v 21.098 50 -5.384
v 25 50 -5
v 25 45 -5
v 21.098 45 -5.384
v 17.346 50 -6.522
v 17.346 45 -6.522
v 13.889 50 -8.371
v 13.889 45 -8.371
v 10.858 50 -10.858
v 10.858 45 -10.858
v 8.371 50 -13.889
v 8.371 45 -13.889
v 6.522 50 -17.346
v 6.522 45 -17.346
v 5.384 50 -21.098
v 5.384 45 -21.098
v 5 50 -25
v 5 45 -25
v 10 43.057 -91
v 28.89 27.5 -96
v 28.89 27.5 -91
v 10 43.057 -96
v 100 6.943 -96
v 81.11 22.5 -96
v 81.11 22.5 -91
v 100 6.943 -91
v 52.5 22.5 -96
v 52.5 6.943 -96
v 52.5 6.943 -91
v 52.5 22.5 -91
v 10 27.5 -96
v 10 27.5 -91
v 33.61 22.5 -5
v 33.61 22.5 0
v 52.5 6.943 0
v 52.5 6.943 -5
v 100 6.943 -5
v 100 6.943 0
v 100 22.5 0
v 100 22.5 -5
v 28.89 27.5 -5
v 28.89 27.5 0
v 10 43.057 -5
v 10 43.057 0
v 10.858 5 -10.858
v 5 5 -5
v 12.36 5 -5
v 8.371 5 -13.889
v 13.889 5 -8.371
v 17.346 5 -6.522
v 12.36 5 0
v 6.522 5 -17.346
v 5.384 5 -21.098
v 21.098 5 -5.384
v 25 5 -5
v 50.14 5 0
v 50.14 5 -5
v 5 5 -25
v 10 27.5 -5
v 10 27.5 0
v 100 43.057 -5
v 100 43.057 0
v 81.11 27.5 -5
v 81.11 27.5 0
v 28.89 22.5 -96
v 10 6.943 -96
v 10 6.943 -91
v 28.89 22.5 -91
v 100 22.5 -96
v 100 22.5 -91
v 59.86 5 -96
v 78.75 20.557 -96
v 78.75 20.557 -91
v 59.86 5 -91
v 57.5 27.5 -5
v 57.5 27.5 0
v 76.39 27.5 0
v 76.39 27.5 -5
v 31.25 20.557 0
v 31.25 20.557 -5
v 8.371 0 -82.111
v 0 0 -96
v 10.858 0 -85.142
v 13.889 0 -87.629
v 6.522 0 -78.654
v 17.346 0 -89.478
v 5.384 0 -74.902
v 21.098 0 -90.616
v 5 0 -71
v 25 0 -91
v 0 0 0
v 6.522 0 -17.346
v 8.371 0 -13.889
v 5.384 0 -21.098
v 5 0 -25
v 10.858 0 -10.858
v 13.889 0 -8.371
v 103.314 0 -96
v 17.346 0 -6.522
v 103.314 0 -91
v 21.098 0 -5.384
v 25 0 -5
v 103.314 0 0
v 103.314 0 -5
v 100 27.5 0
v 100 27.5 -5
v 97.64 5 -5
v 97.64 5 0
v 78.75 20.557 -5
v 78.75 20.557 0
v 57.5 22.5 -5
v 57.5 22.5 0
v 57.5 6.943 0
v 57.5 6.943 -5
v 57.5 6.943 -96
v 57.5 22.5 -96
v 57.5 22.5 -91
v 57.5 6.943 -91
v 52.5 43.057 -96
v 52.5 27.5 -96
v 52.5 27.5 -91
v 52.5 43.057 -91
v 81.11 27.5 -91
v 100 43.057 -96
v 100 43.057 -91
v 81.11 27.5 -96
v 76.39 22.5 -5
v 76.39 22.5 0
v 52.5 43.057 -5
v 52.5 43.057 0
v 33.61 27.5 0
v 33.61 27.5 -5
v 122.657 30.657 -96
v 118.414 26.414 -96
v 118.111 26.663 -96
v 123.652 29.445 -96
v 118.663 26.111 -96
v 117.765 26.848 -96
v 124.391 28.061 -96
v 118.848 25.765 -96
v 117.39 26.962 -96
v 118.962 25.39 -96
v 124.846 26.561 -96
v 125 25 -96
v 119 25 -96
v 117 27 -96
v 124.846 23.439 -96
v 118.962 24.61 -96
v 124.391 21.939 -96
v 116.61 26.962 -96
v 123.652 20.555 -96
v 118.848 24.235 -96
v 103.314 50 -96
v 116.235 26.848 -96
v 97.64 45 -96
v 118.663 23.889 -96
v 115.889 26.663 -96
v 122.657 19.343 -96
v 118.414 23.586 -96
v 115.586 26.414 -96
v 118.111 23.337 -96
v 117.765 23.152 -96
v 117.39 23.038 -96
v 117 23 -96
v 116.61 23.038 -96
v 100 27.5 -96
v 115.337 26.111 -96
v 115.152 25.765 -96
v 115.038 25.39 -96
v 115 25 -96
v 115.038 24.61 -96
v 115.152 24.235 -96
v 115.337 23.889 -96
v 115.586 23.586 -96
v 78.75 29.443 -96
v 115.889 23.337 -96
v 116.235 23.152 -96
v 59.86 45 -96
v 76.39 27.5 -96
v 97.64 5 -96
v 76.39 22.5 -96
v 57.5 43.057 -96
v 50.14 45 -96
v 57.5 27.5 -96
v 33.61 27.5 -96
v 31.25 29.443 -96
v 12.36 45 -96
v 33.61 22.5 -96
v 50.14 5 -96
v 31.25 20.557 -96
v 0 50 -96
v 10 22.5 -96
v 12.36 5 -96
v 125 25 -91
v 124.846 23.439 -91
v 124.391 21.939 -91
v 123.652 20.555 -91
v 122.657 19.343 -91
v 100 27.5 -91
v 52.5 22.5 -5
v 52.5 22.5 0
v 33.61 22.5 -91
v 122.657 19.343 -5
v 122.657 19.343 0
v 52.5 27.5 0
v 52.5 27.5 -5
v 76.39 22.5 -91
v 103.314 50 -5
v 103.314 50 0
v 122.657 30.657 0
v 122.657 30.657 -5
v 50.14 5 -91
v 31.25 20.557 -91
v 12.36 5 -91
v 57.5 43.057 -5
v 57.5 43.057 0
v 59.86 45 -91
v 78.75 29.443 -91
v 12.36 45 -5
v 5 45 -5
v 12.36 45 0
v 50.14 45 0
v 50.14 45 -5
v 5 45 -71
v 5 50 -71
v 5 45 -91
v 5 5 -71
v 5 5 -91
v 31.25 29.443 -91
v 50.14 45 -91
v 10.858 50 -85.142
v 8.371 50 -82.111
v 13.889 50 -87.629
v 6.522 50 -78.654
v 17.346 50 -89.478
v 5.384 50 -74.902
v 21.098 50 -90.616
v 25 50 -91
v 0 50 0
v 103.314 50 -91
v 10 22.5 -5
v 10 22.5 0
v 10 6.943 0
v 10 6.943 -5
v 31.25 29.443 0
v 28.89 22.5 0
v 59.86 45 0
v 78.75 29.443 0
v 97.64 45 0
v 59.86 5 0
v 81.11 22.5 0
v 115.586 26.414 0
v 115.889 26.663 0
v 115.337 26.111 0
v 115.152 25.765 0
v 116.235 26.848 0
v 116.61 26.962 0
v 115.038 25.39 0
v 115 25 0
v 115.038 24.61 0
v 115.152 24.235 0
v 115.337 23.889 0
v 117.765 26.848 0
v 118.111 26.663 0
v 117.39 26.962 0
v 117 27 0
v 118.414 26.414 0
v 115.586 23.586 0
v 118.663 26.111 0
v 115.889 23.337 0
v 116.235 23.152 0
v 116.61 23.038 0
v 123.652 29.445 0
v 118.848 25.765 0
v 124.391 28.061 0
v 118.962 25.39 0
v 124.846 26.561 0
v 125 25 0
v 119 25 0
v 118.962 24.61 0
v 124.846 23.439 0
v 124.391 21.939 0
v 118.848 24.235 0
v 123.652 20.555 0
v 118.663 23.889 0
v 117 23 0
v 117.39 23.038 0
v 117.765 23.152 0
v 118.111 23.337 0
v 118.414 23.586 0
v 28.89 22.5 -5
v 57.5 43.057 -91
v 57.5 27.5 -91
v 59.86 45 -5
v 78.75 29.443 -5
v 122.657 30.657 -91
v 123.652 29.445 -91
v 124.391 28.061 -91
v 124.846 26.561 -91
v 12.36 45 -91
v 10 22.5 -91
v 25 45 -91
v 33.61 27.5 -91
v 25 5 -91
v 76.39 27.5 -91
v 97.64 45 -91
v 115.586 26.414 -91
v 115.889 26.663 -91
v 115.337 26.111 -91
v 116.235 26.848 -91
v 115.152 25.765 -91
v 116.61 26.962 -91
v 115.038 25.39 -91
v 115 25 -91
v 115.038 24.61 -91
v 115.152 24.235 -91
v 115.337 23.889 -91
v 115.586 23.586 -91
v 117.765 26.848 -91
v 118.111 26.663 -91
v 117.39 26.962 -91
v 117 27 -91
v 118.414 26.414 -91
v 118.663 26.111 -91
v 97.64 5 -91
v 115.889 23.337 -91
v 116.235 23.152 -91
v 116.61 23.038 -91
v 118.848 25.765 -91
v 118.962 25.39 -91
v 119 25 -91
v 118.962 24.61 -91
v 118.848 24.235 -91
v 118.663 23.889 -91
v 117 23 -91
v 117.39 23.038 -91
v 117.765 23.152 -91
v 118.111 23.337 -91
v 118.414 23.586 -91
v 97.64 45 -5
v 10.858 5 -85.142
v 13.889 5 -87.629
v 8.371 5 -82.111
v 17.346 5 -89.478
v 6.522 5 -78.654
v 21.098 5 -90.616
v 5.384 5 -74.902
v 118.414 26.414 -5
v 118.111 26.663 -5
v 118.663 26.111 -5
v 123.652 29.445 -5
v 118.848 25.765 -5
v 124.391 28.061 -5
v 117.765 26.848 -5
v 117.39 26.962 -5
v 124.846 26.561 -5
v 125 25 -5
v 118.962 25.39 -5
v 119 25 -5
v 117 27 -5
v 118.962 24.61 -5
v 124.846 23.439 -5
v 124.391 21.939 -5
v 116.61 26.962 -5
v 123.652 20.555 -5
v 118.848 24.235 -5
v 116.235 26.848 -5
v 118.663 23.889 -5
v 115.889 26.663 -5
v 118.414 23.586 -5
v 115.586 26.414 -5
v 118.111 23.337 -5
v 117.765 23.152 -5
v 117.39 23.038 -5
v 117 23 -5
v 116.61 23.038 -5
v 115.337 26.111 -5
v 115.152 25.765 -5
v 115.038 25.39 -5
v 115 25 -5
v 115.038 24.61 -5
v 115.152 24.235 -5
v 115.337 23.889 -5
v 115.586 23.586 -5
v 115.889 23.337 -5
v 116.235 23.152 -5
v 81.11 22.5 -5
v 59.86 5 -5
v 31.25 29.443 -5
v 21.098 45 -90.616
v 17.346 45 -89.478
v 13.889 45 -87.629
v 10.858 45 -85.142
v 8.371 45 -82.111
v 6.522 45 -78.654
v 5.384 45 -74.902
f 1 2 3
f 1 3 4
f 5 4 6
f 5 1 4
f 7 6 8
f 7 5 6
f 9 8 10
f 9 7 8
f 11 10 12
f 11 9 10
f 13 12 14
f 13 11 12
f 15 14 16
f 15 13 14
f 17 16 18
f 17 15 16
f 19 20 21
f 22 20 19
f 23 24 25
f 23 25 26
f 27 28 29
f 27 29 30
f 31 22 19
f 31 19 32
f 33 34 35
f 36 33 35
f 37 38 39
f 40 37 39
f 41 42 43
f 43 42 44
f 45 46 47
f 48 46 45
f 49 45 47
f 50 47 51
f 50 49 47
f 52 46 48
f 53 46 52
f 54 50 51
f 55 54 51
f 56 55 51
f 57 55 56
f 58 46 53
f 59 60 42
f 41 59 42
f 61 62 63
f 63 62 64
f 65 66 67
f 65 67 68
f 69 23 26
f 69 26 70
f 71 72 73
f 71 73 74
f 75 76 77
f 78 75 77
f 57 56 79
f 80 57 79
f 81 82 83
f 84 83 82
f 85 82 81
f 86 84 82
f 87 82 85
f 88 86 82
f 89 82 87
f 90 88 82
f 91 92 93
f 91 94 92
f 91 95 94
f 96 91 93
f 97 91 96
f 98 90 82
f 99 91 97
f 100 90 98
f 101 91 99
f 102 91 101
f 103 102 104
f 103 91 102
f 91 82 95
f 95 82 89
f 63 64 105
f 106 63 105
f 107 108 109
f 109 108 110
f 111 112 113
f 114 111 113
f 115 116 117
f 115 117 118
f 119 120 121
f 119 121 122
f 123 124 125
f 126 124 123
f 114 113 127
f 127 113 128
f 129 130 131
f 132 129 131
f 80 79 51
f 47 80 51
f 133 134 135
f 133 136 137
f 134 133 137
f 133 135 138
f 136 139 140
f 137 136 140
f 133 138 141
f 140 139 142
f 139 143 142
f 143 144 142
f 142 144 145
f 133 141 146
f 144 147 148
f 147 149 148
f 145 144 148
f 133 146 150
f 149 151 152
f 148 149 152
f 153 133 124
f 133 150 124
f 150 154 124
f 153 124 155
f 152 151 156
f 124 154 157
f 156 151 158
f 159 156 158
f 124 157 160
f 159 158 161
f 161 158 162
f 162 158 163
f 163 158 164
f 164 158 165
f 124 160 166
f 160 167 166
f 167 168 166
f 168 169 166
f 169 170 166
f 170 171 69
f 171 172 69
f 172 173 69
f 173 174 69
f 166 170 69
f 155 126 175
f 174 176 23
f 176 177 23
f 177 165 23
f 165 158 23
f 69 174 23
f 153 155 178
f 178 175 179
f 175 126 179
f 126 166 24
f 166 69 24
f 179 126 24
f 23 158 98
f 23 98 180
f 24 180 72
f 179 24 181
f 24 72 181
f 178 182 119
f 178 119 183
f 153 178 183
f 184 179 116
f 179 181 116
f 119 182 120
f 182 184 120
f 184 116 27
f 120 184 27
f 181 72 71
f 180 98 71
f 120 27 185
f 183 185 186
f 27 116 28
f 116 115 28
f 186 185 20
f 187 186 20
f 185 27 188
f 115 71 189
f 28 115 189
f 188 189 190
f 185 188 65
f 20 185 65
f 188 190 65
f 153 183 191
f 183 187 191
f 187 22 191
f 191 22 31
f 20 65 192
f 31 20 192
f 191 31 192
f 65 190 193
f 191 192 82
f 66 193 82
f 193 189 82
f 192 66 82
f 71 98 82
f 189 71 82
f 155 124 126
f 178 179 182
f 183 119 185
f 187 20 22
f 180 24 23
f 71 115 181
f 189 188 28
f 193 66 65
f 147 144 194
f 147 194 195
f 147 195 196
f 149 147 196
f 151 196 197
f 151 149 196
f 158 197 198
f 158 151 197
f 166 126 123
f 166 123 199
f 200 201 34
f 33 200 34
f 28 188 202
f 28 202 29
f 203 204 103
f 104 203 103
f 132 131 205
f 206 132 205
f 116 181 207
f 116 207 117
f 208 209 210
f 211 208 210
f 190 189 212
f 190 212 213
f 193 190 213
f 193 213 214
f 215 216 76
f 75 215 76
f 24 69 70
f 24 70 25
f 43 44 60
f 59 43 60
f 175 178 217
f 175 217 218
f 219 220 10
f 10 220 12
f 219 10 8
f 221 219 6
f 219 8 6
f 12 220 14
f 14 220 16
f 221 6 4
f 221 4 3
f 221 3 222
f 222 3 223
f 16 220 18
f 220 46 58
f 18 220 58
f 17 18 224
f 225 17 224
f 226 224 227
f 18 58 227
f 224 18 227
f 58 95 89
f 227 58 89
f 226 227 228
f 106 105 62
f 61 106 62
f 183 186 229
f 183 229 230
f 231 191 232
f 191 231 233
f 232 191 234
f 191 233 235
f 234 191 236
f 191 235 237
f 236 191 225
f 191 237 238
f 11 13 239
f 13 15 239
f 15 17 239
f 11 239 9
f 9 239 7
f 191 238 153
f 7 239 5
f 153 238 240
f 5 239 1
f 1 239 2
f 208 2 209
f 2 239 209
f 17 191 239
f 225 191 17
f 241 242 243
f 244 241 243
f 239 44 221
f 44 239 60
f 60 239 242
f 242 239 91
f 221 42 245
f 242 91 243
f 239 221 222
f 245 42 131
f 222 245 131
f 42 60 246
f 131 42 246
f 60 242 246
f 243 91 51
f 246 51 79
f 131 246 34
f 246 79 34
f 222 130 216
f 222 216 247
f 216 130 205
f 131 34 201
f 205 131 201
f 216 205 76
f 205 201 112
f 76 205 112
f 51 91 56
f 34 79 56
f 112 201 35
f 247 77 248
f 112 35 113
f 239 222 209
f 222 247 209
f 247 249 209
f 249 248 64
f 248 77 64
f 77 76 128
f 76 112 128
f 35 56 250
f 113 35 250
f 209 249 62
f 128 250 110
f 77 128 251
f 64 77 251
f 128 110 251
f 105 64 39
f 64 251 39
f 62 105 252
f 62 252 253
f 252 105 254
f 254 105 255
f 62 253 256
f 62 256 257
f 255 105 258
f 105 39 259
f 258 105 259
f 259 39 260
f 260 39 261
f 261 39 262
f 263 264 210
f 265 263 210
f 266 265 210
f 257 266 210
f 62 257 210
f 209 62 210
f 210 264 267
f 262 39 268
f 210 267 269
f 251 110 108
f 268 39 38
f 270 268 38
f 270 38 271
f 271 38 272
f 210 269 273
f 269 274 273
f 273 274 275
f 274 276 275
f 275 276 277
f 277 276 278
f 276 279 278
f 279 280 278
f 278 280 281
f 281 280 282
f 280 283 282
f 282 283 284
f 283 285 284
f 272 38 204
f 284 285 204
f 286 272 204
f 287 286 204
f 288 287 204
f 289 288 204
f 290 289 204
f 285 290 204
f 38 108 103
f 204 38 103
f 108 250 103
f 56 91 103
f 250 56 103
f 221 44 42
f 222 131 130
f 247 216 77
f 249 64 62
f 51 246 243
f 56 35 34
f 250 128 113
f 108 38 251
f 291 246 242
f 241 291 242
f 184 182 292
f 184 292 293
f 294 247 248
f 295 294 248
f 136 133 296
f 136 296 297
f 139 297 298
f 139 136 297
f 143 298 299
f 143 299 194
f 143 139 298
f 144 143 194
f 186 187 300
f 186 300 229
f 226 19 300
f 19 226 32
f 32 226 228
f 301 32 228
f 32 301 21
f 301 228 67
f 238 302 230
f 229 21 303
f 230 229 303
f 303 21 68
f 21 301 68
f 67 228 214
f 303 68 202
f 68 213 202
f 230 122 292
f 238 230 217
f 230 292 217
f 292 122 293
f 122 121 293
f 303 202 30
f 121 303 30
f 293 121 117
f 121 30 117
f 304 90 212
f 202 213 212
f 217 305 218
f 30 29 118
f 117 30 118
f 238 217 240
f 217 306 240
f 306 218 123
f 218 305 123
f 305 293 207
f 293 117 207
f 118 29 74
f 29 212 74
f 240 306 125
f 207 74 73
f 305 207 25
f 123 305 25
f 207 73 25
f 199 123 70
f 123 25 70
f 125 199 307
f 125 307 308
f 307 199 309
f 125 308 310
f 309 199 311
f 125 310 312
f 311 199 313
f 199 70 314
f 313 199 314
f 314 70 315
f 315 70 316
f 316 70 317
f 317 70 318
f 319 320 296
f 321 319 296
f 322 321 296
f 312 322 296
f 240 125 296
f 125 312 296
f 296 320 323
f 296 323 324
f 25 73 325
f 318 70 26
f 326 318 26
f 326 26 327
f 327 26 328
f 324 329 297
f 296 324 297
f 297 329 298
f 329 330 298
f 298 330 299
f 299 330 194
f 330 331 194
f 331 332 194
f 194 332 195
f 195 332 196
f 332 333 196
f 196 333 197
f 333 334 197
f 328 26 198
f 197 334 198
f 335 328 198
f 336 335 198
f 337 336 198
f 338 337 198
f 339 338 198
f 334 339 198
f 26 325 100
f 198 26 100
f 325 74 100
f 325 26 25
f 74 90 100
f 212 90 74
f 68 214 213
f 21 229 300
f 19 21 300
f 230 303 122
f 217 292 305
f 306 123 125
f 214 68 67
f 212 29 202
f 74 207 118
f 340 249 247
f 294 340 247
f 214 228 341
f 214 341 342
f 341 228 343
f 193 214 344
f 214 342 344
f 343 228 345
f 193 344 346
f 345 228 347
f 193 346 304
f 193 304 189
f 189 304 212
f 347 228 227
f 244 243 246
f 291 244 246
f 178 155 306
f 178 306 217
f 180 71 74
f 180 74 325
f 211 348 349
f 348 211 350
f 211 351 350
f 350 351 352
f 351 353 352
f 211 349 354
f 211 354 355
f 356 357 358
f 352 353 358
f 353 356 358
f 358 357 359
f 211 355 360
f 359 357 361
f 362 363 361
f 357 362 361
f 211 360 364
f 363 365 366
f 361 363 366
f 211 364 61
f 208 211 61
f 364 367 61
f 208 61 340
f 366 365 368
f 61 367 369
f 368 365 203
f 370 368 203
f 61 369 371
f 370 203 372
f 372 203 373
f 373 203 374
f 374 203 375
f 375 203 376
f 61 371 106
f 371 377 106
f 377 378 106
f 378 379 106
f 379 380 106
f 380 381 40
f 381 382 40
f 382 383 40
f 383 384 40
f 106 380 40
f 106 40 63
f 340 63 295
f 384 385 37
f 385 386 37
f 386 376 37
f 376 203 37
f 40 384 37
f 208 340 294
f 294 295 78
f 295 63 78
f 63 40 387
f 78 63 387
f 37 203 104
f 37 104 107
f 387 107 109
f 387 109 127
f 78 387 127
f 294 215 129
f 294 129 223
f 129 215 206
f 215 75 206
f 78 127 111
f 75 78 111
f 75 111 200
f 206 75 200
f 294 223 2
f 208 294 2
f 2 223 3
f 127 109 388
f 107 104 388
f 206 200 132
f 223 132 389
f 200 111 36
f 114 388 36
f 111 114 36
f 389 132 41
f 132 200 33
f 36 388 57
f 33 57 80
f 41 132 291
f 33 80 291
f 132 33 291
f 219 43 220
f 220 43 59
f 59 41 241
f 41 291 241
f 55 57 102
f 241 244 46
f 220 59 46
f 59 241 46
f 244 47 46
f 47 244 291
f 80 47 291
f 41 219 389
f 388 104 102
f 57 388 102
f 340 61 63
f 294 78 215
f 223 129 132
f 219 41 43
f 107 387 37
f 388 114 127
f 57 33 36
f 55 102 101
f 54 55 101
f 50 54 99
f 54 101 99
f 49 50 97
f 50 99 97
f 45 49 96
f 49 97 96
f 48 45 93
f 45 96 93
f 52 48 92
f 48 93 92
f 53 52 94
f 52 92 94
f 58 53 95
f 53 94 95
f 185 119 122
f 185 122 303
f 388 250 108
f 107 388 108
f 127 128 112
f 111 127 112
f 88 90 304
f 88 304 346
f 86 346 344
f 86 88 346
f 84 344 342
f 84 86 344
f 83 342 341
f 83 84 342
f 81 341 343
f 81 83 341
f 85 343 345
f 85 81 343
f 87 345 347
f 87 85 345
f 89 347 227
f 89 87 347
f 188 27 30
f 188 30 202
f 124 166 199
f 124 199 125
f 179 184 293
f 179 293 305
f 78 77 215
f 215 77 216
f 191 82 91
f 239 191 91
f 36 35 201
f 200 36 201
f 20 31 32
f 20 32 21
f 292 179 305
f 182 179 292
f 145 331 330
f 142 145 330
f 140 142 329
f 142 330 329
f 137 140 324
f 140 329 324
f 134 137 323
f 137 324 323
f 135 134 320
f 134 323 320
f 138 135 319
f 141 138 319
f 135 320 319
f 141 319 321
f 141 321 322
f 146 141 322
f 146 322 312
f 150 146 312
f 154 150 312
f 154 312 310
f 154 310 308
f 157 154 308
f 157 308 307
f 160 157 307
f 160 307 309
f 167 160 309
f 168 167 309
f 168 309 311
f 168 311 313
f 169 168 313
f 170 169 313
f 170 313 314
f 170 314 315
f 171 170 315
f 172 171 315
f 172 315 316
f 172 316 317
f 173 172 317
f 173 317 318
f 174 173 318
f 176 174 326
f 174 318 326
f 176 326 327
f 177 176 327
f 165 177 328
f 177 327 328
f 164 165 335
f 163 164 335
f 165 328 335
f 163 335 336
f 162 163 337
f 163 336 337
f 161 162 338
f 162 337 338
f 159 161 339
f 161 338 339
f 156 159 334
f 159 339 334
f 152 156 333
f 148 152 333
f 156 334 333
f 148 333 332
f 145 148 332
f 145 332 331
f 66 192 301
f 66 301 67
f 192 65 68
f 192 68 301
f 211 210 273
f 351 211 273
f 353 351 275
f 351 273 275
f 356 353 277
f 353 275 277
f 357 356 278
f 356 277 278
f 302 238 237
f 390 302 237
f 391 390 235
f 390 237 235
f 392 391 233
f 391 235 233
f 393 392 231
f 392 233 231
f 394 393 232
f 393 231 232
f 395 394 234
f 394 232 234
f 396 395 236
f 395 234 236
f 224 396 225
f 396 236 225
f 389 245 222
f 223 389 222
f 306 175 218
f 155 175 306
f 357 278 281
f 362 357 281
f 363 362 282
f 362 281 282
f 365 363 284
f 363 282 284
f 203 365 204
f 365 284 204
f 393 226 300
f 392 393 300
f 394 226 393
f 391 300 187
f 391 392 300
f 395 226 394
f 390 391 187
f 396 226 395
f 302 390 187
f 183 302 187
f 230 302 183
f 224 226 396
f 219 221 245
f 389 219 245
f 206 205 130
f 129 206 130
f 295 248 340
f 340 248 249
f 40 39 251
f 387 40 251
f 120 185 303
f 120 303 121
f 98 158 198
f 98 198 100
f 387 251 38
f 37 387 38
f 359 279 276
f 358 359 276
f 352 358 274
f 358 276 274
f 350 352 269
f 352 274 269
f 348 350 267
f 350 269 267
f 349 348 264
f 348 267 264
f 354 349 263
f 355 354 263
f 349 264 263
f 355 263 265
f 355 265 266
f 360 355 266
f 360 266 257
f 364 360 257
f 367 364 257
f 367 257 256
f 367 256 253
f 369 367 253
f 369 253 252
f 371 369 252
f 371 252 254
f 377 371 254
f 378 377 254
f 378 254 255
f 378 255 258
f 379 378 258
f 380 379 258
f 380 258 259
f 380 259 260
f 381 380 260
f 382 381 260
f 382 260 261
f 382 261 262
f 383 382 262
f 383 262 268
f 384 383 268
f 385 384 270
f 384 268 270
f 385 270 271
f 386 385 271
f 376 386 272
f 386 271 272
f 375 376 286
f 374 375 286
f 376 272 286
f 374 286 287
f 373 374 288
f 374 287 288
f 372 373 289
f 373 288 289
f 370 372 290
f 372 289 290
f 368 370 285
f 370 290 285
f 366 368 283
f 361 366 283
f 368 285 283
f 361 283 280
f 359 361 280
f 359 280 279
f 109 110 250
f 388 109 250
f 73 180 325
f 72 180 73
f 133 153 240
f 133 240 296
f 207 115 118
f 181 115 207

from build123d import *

# Parameters (mm, degrees)
BOSS_EXTRUDE1_DEPTH  = 50
SKETCH2_R            = 2
CUT_EXTRUDE1_DEPTH   = 166.351141514
CUT_EXTRUDE2_DEPTH   = 10
BOSS_EXTRUDE3_DEPTH  = 5
MIRROR5_COPY_1_DEPTH = 5


with BuildPart() as part:
    # Sketch1 → Boss-Extrude1 (new body)
    with BuildSketch(Plane(origin=(0, 0, 0), x_dir=(1, 0, 0), z_dir=(0, 1, 0))):
        Polygon((0, 0), (125, 0), (125, 5), (5, 5), (5, 91), (125, 91), (125, 96), (0, 96), align=None)
    extrude(amount=BOSS_EXTRUDE1_DEPTH)

    # Sketch2 → Cut-Extrude1 (cut, through all)
    with BuildSketch(Plane.XY):
        with Locations((117, 25)):
            Circle(SKETCH2_R)
    extrude(amount=-CUT_EXTRUDE1_DEPTH, mode=Mode.SUBTRACT)

    # Sketch3 → Cut-Extrude2 (cut)
    with BuildSketch(Plane.XY):
        Polygon((52.5, 43.056819217), (33.609576666, 27.5), (52.5, 27.5), align=None)
        Polygon((50.140423334, 45), (12.359576666, 45), (31.25, 29.443180783), align=None)
        Polygon((28.890423334, 27.5), (10, 43.056819217), (10, 27.5), align=None)
        Polygon((10, 6.943180783), (28.890423334, 22.5), (10, 22.5), align=None)
        Polygon((12.359576666, 5), (50.140423334, 5), (31.25, 20.556819217), align=None)
        Polygon((52.5, 6.943180783), (52.5, 22.5), (33.609576666, 22.5), align=None)
        Polygon((57.5, 6.943180783), (76.390423334, 22.5), (57.5, 22.5), align=None)
        Polygon((59.859576666, 5), (97.640423334, 5), (78.75, 20.556819217), align=None)
        Polygon((81.109576666, 22.5), (100, 6.943180783), (100, 22.5), align=None)
        Polygon((100, 43.056819217), (81.109576666, 27.5), (100, 27.5), align=None)
        Polygon((97.640423334, 45), (59.859576666, 45), (78.75, 29.443180783), align=None)
        Polygon((76.390423334, 27.5), (57.5, 43.056819217), (57.5, 27.5), align=None)
        with BuildLine():
            Line((103.313708499, 50), (122.656854249, 30.656854249))
            ThreePointArc((122.656854249, 30.656854249), (124.39103626, 28.061467459), (125, 25))
            Line((125, 25), (125, 50))
            Line((125, 50), (103.313708499, 50))
        make_face()
        with BuildLine():
            Line((125, 0), (125, 25))
            ThreePointArc((125, 25), (124.39103626, 21.938532541), (122.656854249, 19.343145751))
            Line((122.656854249, 19.343145751), (103.313708499, 0))
            Line((103.313708499, 0), (125, 0))
        make_face()
    cut_extrude2 = extrude(amount=-CUT_EXTRUDE2_DEPTH, mode=Mode.SUBTRACT)

    # Mirror3: Cut-Extrude2 across plane
    add(cut_extrude2.mirror(Plane.XY.offset(-48)), mode=Mode.SUBTRACT)

    # Sketch6 → Boss-Extrude3 (add)
    with BuildSketch(Plane(origin=(0, 50, 0), x_dir=(1, 0, 0), z_dir=(0, 1, 0))):
        with BuildLine():
            Line((5, 5), (25, 5))
            ThreePointArc((25, 5), (10.857864376, 10.857864376), (5, 25))
            Line((5, 25), (5, 5))
        make_face()
    boss_extrude3 = extrude(amount=-BOSS_EXTRUDE3_DEPTH)

    # Mirror4: Boss-Extrude3 across plane
    add(boss_extrude3.mirror(Plane.ZX.offset(25)))

    # Mirror5: Boss-Extrude3 across plane
    add(boss_extrude3.mirror(Plane.XY.offset(-48)))

    # Mirror5 copy 1 sketch → Mirror5 copy 1 (add)
    with BuildSketch(Plane(origin=(0, 0, -96), x_dir=(1, 0, 0), z_dir=(0, -1, 0))):
        with BuildLine():
            Line((5, 5), (25, 5))
            ThreePointArc((25, 5), (10.857864376, 10.857864376), (5, 25))
            Line((5, 25), (5, 5))
        make_face()
    extrude(amount=-MIRROR5_COPY_1_DEPTH)


solid = part.part
